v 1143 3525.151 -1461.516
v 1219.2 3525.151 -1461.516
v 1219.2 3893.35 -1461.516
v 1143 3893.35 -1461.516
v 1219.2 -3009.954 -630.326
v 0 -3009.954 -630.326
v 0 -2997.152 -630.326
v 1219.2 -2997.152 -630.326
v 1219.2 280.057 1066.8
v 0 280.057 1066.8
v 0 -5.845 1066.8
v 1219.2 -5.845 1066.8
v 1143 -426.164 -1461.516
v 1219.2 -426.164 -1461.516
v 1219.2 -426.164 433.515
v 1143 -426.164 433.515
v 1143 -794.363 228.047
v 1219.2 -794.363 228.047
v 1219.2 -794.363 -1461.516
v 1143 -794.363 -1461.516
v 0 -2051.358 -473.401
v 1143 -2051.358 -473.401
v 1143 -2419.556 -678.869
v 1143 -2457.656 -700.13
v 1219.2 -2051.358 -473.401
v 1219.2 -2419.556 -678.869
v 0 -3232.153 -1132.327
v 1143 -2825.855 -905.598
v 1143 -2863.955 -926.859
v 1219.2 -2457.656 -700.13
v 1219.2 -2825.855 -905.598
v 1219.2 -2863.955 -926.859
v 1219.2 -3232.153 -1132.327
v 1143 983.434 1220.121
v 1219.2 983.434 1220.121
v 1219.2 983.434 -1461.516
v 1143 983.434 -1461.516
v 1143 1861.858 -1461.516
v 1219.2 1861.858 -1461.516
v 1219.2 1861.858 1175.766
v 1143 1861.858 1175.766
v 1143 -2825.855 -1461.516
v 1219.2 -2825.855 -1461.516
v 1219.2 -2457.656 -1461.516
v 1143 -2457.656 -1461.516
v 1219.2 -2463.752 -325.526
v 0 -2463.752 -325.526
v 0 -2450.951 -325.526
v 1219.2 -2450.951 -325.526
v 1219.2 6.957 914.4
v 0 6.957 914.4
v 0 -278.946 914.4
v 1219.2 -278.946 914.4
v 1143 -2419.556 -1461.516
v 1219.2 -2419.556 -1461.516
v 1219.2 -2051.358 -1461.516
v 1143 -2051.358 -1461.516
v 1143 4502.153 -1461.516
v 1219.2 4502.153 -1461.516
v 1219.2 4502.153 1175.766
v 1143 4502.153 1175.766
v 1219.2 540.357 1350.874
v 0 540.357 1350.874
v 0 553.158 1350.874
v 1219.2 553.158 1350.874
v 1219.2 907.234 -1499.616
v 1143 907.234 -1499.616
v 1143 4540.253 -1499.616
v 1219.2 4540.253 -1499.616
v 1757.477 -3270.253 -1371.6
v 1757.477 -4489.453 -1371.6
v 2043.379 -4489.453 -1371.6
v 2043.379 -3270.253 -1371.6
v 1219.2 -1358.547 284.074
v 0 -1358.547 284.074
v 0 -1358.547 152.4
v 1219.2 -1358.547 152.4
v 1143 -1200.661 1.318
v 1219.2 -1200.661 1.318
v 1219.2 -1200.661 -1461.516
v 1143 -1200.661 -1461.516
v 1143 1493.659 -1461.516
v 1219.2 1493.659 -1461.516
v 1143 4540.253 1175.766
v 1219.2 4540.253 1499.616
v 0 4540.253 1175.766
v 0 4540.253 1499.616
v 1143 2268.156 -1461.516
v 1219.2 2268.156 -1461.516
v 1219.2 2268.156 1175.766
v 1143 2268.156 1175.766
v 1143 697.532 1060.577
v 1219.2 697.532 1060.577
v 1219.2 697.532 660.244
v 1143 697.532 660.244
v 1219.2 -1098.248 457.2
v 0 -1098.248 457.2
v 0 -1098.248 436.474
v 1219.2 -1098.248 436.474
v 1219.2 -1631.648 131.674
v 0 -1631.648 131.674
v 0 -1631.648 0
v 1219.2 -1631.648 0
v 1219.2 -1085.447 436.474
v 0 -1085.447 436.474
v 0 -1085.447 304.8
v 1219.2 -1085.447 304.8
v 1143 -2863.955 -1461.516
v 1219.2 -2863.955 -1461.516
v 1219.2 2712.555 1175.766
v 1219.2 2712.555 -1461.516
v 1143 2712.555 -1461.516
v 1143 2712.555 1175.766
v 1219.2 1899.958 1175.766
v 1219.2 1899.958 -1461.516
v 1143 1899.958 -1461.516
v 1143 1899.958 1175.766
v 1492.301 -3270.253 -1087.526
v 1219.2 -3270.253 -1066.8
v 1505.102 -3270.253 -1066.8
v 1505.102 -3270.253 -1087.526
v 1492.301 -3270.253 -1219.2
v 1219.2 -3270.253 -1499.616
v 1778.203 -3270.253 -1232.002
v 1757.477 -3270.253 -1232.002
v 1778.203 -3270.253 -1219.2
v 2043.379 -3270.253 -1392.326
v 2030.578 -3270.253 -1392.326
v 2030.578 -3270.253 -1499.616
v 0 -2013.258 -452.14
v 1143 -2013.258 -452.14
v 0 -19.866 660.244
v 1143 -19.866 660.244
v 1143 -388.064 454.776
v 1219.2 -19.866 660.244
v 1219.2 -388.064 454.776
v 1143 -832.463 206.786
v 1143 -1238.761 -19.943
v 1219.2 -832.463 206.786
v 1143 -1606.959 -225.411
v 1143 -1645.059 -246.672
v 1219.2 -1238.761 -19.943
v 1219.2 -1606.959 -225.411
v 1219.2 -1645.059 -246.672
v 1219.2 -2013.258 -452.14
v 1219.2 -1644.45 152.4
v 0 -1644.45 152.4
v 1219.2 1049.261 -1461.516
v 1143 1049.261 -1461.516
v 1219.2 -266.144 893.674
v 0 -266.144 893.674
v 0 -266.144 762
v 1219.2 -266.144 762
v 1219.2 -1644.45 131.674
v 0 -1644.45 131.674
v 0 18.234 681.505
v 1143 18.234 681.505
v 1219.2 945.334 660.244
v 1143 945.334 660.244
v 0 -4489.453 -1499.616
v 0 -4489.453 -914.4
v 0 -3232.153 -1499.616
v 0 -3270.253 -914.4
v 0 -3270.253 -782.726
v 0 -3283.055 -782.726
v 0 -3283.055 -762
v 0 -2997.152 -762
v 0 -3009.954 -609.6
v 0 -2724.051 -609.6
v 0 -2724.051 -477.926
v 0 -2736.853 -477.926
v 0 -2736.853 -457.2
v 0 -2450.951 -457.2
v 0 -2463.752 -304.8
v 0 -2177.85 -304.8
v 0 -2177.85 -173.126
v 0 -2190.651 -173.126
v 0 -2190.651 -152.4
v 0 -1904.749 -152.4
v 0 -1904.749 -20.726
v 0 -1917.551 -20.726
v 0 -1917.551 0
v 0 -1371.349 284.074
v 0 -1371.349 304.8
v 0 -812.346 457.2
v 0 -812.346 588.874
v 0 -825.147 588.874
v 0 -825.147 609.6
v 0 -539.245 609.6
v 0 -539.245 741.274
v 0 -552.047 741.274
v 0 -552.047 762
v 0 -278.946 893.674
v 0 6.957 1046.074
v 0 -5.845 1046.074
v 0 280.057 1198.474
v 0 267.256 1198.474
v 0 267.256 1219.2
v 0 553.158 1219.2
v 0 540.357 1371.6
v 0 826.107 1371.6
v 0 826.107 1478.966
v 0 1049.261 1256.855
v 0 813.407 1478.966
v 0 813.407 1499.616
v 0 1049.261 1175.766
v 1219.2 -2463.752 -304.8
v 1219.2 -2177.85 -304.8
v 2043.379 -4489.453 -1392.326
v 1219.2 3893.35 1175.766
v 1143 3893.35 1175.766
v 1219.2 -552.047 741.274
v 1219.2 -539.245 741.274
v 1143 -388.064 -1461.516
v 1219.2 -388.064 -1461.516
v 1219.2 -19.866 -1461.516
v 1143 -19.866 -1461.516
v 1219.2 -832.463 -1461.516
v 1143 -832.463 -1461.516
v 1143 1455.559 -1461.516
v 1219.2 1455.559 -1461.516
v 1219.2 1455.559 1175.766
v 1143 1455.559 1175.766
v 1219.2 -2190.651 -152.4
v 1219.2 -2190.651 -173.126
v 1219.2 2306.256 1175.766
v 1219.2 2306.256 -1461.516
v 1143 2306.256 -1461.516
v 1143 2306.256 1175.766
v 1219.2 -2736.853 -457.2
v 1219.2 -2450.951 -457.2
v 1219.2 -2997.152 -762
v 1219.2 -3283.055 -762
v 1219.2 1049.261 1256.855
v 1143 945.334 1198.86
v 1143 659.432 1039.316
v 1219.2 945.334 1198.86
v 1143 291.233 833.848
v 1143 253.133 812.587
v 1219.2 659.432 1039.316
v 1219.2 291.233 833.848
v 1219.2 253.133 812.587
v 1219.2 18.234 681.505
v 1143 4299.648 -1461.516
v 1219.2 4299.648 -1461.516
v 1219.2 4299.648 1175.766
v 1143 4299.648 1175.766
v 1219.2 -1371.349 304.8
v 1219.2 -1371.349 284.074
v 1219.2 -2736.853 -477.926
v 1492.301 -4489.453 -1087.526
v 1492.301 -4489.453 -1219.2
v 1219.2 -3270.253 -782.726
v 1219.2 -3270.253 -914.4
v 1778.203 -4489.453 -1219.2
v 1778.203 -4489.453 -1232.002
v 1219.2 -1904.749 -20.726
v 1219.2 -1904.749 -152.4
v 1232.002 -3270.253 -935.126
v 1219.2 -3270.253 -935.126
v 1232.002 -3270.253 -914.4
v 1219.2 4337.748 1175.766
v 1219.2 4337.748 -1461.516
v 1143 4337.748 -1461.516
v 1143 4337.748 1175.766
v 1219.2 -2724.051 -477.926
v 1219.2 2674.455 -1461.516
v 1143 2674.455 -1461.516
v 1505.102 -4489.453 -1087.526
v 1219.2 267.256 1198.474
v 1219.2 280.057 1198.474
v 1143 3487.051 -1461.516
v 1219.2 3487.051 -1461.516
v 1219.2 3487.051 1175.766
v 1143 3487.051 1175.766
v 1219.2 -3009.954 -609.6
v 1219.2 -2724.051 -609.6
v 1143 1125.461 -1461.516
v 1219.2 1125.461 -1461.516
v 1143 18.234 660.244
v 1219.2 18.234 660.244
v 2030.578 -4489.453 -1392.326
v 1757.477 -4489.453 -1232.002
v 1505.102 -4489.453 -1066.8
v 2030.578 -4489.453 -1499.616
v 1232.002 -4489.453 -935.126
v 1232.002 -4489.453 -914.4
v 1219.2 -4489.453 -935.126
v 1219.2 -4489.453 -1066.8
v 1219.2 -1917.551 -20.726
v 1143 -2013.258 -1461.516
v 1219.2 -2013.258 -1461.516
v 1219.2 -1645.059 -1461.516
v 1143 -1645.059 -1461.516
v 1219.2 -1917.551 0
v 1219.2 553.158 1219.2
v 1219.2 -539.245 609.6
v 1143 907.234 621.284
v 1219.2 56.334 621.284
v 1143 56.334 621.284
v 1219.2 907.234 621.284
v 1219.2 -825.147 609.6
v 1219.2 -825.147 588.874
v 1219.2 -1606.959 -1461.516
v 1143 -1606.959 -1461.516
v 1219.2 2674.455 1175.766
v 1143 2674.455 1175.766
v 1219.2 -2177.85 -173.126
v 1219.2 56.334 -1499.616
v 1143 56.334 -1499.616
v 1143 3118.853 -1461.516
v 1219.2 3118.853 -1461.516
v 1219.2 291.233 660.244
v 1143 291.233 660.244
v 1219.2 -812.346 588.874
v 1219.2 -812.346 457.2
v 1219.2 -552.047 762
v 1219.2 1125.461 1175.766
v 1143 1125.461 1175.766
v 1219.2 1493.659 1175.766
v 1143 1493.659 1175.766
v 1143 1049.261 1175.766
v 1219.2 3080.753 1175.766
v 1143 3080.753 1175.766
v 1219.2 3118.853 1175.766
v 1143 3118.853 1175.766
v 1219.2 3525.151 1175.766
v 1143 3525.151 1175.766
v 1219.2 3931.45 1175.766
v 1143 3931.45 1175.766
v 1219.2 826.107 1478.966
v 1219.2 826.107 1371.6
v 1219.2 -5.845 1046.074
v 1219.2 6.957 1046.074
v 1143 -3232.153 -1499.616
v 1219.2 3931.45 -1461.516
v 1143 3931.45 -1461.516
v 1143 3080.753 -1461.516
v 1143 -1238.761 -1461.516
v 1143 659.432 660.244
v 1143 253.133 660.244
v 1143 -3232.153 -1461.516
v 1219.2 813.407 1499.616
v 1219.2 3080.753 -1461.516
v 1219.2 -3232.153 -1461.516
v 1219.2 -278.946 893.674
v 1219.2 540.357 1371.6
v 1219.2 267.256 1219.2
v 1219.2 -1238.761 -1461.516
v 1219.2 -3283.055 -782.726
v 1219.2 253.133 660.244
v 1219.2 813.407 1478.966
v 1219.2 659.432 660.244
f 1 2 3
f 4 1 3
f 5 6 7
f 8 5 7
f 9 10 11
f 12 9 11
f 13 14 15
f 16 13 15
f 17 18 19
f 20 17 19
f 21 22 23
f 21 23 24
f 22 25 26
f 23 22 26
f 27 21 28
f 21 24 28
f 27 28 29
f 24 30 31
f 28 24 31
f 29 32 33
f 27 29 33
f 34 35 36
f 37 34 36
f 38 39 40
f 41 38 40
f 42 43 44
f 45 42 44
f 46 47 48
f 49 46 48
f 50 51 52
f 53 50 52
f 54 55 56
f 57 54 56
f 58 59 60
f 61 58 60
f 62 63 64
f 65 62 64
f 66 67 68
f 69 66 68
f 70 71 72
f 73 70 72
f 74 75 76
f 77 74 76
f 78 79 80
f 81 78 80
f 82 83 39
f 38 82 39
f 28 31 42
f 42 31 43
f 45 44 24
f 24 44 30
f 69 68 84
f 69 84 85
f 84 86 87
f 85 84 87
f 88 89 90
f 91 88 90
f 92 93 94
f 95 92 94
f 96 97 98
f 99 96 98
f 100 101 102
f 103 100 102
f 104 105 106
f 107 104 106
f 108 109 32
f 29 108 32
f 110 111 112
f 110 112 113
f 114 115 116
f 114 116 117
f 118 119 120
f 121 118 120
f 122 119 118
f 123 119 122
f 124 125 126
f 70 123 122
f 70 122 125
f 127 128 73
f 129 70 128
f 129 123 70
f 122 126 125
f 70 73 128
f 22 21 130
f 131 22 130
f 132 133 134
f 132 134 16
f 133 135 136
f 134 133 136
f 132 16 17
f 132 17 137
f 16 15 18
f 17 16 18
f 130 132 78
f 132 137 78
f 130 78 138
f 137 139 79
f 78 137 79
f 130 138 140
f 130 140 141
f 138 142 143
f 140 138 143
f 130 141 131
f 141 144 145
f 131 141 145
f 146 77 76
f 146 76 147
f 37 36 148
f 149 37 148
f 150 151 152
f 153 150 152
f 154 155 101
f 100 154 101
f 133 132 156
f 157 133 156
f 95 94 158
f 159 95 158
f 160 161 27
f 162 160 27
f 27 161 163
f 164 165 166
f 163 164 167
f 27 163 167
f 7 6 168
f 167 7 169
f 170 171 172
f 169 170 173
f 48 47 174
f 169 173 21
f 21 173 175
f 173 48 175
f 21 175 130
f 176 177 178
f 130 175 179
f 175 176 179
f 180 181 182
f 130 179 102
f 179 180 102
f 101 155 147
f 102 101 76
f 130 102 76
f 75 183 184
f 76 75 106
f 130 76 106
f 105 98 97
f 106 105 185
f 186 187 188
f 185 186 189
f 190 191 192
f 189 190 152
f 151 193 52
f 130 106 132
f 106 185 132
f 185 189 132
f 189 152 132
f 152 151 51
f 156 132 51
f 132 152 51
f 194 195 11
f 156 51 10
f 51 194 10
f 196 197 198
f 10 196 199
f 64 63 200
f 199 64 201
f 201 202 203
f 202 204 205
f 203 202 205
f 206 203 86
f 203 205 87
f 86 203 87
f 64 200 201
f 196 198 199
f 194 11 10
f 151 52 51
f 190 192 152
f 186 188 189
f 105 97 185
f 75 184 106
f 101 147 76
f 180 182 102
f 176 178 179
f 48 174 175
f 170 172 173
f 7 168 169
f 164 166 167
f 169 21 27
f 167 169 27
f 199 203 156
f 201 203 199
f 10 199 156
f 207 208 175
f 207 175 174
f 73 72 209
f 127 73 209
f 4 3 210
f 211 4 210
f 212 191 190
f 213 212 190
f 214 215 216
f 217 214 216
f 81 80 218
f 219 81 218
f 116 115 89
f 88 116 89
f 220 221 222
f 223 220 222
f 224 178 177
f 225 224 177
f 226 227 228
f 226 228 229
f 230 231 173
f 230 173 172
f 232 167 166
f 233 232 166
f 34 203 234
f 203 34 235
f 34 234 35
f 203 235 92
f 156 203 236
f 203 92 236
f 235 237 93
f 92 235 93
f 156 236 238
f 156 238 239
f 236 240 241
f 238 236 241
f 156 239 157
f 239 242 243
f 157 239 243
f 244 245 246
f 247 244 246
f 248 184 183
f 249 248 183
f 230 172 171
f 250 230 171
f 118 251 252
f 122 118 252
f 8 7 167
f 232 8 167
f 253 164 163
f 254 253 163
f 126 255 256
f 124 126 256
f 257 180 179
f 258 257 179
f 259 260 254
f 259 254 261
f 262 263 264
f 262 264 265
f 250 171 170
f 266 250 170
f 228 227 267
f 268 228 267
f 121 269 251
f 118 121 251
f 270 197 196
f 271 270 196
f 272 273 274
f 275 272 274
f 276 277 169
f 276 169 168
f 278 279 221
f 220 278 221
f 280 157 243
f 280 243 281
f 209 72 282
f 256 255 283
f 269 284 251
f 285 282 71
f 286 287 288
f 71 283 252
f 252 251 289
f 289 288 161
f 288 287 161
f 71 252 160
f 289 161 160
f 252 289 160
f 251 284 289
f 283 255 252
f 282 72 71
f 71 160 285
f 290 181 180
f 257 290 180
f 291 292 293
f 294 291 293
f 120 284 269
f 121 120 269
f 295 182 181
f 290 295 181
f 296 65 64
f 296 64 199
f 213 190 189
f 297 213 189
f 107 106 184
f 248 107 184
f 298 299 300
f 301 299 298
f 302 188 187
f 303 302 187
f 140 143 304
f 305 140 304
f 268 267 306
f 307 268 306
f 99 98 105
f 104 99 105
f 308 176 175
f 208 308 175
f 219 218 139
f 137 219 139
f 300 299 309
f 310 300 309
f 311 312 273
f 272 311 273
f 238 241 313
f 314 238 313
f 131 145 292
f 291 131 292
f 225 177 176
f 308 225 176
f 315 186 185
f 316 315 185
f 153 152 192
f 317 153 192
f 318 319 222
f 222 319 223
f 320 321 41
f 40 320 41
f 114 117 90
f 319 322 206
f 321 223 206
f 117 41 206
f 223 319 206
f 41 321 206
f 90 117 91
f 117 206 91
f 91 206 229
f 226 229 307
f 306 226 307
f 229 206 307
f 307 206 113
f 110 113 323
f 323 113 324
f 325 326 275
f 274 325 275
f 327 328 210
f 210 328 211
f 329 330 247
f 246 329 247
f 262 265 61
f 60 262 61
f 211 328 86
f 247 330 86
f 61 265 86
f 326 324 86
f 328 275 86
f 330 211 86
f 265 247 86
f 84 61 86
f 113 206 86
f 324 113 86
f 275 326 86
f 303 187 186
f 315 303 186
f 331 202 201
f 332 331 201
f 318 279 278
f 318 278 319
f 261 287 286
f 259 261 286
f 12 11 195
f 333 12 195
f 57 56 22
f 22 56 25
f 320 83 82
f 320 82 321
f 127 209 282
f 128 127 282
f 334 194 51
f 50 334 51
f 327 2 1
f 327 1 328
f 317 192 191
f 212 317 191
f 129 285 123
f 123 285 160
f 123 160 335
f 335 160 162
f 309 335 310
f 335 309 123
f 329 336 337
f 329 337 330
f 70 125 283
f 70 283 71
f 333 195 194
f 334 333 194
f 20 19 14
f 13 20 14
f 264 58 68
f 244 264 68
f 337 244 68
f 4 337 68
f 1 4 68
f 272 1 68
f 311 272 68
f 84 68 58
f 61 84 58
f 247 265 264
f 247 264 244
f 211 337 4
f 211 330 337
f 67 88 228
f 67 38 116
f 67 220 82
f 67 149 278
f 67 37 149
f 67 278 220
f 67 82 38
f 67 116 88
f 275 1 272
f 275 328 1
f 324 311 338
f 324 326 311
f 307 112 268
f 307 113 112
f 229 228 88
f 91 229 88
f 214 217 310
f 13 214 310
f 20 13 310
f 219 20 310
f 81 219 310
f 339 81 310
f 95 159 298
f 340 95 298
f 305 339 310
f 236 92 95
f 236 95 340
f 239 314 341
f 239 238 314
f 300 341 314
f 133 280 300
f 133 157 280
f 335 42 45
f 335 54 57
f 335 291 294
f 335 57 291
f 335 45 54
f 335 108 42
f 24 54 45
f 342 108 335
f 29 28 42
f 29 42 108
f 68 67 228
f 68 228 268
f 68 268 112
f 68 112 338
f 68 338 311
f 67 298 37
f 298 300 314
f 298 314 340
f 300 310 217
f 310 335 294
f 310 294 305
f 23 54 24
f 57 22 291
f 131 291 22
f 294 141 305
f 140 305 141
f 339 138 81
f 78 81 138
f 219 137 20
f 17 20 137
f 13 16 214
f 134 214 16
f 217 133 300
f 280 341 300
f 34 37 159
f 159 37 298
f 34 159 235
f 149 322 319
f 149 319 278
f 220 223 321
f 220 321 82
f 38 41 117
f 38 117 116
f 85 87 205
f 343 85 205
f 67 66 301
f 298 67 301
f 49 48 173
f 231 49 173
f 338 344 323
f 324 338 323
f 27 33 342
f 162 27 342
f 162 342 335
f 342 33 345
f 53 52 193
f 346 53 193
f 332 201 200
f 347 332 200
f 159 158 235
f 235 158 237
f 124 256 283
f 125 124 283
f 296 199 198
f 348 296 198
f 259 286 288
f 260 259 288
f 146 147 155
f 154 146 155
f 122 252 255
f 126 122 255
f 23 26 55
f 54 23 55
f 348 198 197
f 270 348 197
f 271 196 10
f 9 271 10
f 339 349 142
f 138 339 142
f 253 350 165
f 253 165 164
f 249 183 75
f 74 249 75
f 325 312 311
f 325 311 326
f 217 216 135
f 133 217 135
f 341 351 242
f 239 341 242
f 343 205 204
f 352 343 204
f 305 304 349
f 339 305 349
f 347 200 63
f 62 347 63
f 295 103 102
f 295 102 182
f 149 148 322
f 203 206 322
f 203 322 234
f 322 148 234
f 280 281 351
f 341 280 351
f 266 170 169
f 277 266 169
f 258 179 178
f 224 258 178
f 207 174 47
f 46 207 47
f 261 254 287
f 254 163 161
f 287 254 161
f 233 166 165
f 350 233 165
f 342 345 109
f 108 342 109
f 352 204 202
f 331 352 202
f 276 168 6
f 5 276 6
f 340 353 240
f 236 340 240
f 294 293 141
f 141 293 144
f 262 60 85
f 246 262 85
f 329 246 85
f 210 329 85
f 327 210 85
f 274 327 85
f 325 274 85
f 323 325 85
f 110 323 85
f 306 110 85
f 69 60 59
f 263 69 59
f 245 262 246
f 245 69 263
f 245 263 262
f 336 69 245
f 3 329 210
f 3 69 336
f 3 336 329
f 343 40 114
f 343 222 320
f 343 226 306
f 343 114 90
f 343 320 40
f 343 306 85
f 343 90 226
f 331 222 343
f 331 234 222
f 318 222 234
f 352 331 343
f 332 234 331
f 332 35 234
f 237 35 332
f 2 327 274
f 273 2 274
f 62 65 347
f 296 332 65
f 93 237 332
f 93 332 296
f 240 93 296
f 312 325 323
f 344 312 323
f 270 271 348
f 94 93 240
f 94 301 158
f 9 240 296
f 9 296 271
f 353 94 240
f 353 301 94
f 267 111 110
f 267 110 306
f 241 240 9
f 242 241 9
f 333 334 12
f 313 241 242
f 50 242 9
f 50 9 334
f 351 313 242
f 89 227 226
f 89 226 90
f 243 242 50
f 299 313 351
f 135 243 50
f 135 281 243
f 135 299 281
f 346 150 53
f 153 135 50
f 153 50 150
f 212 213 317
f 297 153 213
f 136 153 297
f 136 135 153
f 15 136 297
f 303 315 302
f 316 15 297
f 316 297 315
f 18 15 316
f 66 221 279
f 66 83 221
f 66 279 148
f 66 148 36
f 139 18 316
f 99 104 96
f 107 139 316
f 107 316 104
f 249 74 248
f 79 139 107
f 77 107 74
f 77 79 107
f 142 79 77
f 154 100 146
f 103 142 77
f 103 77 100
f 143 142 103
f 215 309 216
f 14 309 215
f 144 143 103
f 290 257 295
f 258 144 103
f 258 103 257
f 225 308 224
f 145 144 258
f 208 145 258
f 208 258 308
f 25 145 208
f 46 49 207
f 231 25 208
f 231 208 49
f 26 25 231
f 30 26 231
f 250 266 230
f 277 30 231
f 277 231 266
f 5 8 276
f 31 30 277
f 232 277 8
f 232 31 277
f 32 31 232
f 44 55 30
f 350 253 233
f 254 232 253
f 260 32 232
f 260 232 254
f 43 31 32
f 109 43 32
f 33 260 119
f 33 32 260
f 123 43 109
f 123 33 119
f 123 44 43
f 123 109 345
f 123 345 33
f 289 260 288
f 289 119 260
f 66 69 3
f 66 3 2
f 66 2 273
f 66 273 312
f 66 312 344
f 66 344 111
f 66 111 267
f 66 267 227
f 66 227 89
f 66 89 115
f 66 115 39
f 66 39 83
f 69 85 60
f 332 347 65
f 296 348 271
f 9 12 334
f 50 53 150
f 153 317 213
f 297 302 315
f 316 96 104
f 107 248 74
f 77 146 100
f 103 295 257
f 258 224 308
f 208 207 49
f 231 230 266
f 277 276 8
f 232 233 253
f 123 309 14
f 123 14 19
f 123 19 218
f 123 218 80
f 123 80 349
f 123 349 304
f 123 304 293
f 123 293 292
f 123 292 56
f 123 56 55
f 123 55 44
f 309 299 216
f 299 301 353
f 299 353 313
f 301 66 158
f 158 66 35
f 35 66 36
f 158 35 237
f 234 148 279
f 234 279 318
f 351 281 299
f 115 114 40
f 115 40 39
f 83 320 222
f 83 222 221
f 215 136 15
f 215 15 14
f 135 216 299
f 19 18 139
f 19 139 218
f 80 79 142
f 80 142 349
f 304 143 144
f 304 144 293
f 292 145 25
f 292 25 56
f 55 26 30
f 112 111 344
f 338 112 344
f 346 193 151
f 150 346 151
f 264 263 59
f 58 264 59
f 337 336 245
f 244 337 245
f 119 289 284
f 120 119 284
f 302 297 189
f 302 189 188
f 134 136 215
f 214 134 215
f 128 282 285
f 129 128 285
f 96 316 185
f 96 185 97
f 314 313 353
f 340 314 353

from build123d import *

# Parameters (mm, degrees)
F1_DEPTH  = 2438.4
F2_W      = 1219.2
F2_H      = 7810.50601472
F3_DEPTH  = 6096
F4_DEPTH  = 1219.2
F6_DEPTH  = 12192
F7_W      = 850.9
F7_H      = 2082.8
F7_W_2    = 330.0984
F7_H_2    = 2637.282
F7_W_3    = 368.1984
F7_W_4    = 164.4047516028
F7_H_3    = 38.1
F8_DEPTH  = 1524
F10_DEPTH = 1143


with BuildPart() as f1:
    # F0 (on Right) → F1 (new body)
    with BuildSketch(Plane.YZ):
        Polygon((4540.25300736, -1499.616), (4540.25300736, 1499.616), (813.40659264, 1499.616), (813.40659264, 1478.9658), (826.10659264, 1478.9658), (826.10659264, 1371.6), (540.35659264, 1371.6), (540.35659264, 1350.8736), (553.15819264, 1350.8736), (553.15819264, 1219.2), (267.25579264, 1219.2), (267.25579264, 1198.4736), (280.05739264, 1198.4736), (280.05739264, 1066.8), (-5.84500736, 1066.8), (-5.84500736, 1046.0736), (6.95659264, 1046.0736), (6.95659264, 914.4), (-278.94580736, 914.4), (-278.94580736, 893.6736), (-266.14420736, 893.6736), (-266.14420736, 762), (-552.04660736, 762), (-552.04660736, 741.2736), (-539.24500736, 741.2736), (-539.24500736, 609.6), (-825.14740736, 609.6), (-825.14740736, 588.8736), (-812.34580736, 588.8736), (-812.34580736, 457.2), (-1098.24820736, 457.2), (-1098.24820736, 436.4736), (-1085.44660736, 436.4736), (-1085.44660736, 304.8), (-1371.34900736, 304.8), (-1371.34900736, 284.0736), (-1358.54740736, 284.0736), (-1358.54740736, 152.4), (-1644.44980736, 152.4), (-1644.44980736, 131.6736), (-1631.64820736, 131.6736), (-1631.64820736, 0), (-1917.55060736, 0), (-1917.55060736, -20.7264), (-1904.74900736, -20.7264), (-1904.74900736, -152.4), (-2190.65140736, -152.4), (-2190.65140736, -173.1264), (-2177.84980736, -173.1264), (-2177.84980736, -304.8), (-2463.75220736, -304.8), (-2463.75220736, -325.5264), (-2450.95060736, -325.5264), (-2450.95060736, -457.2), (-2736.85300736, -457.2), (-2736.85300736, -477.9264), (-2724.05140736, -477.9264), (-2724.05140736, -609.6), (-3009.95380736, -609.6), (-3009.95380736, -630.3264), (-2997.15220736, -630.3264), (-2997.15220736, -762), (-3283.05460736, -762), (-3283.05460736, -782.7264), (-3270.25300736, -782.7264), (-3270.25300736, -914.4), (-4489.45300736, -914.4), (-4489.45300736, -1499.616), align=None)
    extrude(amount=F1_DEPTH)

    # F2 (on face) → F3 (cut)
    with BuildSketch(Plane(origin=(0, 0, -1499.616), x_dir=(1, 0, 0), z_dir=(0, 0, -1))):
        with Locations((1828.8, -635)):
            Rectangle(F2_W, F2_H)
    extrude(amount=-F3_DEPTH, mode=Mode.SUBTRACT)

    # F4 (cut): a face of the model
    f4_faces = [f1.faces().sort_by_distance(p)[0] for p in [
        (2438.4, -3276.65380736, -772.3632),
    ]]
    extrude(f4_faces, amount=-F4_DEPTH, mode=Mode.SUBTRACT)

    # F5 (on face) → F6 (cut)
    with BuildSketch(Plane.XZ.offset(4489.45300736)):
        Polygon((2438.4, -914.4), (1232.0016, -914.4), (1232.0016, -935.1264), (1219.2, -935.1264), (1219.2, -1066.8), (1505.1024, -1066.8), (1505.1024, -1087.5264), (1492.3008, -1087.5264), (1492.3008, -1219.2), (1778.2032, -1219.2), (1778.2032, -1232.0016), (1757.4768, -1232.0016), (1757.4768, -1371.6), (2043.3792, -1371.6), (2043.3792, -1392.3264), (2030.5776, -1392.3264), (2030.5776, -1499.616), (2438.4, -1499.616), align=None)
    extrude(amount=-F6_DEPTH, mode=Mode.SUBTRACT)

    # F7 (on face) → F8 (cut)
    with BuildSketch(Plane.YZ.offset(1219.2)):
        Polygon((-3232.15300736, -1461.516), (-2863.95460736, -1461.516), (-2863.95460736, -926.8592061324), (-3232.15300736, -1132.3270632753), align=None)
        Polygon((-2825.85460736, -1461.516), (-2457.65620736, -1461.516), (-2457.65620736, -700.1301882753), (-2825.85460736, -905.5980454181), align=None)
        Polygon((-2419.55620736, -1461.516), (-2051.35780736, -1461.516), (-2051.35780736, -473.4011704181), (-2419.55620736, -678.869027561), align=None)
        Polygon((-2013.25780736, -1461.516), (-1645.05940736, -1461.516), (-1645.05940736, -246.672152561), (-2013.25780736, -452.1400097039), align=None)
        Polygon((-1606.95940736, -1461.516), (-1238.76100736, -1461.516), (-1238.76100736, -19.9431347039), (-1606.95940736, -225.4109918467), align=None)
        Polygon((-1200.66100736, -1461.516), (-832.46260736, -1461.516), (-832.46260736, 206.7858831533), (-1200.66100736, 1.3180260104), align=None)
        Polygon((-794.36260736, -1461.516), (-426.16420736, -1461.516), (-426.16420736, 433.5149010104), (-794.36260736, 228.0470438676), align=None)
        Polygon((-388.06420736, -1461.516), (-19.86580736, -1461.516), (-19.86580736, 660.2439188676), (-388.06420736, 454.7760617247), align=None)
        with Locations((481.78419264, -420.116)):
            Rectangle(F7_W, F7_H)
        Polygon((18.23419264, 681.5050795818), (18.23419264, 660.2439188676), (253.13339264, 660.2439188676), (253.13339264, 812.587222439), align=None)
        Polygon((659.43179264, 660.2439188676), (659.43179264, 1039.3162402961), (291.23339264, 833.8483831533), (291.23339264, 660.2439188676), align=None)
        Polygon((945.33419264, 660.2439188676), (945.33419264, 1198.8599902961), (697.53179264, 1060.5774010104), (697.53179264, 660.2439188676), align=None)
        Polygon((1049.2610557572, -1461.516), (1049.2610557572, 1256.8548915892), (983.43419264, 1220.1211510104), (983.43419264, -1461.516), align=None)
        with Locations((1290.5102557572, -142.875)):
            Rectangle(F7_W_2, F7_H_2)
        with Locations((1677.7586557572, -142.875)):
            Rectangle(F7_W_3, F7_H_2)
        with Locations((2084.0570557572, -142.875)):
            Rectangle(F7_W_3, F7_H_2)
        with Locations((2490.3554557572, -142.875)):
            Rectangle(F7_W_3, F7_H_2)
        with Locations((2896.6538557572, -142.875)):
            Rectangle(F7_W_3, F7_H_2)
        with Locations((3302.9522557572, -142.875)):
            Rectangle(F7_W_3, F7_H_2)
        with Locations((3709.2506557572, -142.875)):
            Rectangle(F7_W_3, F7_H_2)
        with Locations((4115.5490557572, -142.875)):
            Rectangle(F7_W_3, F7_H_2)
        with Locations((4419.9506315586, -142.875)):
            Rectangle(F7_W_4, F7_H_2)
        with Locations((481.78419264, -1480.566)):
            Rectangle(F7_W, F7_H_3)
    extrude(amount=-F8_DEPTH, mode=Mode.SUBTRACT)

    # F9 (on face) → F10 (cut)
    with BuildSketch(Plane(origin=(0, 0, 0), x_dir=(0, -1, 0), z_dir=(-1, 0, 0))):
        Polygon((-4502.15300736, 1175.766), (-4540.25300736, 1175.766), (-4540.25300736, -1499.616), (-907.23419264, -1499.616), (-907.23419264, 621.284), (-56.33419264, 621.284), (-56.33419264, -1499.616), (3232.15300736, -1499.616), (3232.15300736, -1461.516), (2863.95460736, -1461.516), (2863.95460736, -926.8592061324), (2825.85460736, -905.5980454181), (2825.85460736, -1461.516), (2457.65620736, -1461.516), (2457.65620736, -700.1301882753), (2419.55620736, -678.869027561), (2419.55620736, -1461.516), (2051.35780736, -1461.516), (2051.35780736, -473.4011704181), (2013.25780736, -452.1400097039), (2013.25780736, -1461.516), (1645.05940736, -1461.516), (1645.05940736, -246.672152561), (1606.95940736, -225.4109918467), (1606.95940736, -1461.516), (1238.76100736, -1461.516), (1238.76100736, -19.9431347039), (1200.66100736, 1.3180260104), (1200.66100736, -1461.516), (832.46260736, -1461.516), (832.46260736, 206.7858831533), (794.36260736, 228.0470438676), (794.36260736, -1461.516), (426.16420736, -1461.516), (426.16420736, 433.5149010104), (388.06420736, 454.7760617247), (388.06420736, -1461.516), (19.86580736, -1461.516), (19.86580736, 660.2439188676), (-18.23419264, 681.5050795818), (-18.23419264, 660.2439188676), (-253.13339264, 660.2439188676), (-253.13339264, 812.587222439), (-291.23339264, 833.8483831533), (-291.23339264, 660.2439188676), (-659.43179264, 660.2439188676), (-659.43179264, 1039.3162402961), (-697.53179264, 1060.5774010104), (-697.53179264, 660.2439188676), (-945.33419264, 660.2439188676), (-945.33419264, 1198.8599902961), (-983.43419264, 1220.1211510104), (-983.43419264, -1461.516), (-1049.2610557572, -1461.516), (-1049.2610557572, 1175.766), (-1125.4610557572, 1175.766), (-1125.4610557572, -1461.516), (-1455.5594557572, -1461.516), (-1455.5594557572, 1175.766), (-1493.6594557572, 1175.766), (-1493.6594557572, -1461.516), (-1861.8578557572, -1461.516), (-1861.8578557572, 1175.766), (-1899.9578557572, 1175.766), (-1899.9578557572, -1461.516), (-2268.1562557572, -1461.516), (-2268.1562557572, 1175.766), (-2306.2562557572, 1175.766), (-2306.2562557572, -1461.516), (-2674.4546557572, -1461.516), (-2674.4546557572, 1175.766), (-2712.5546557572, 1175.766), (-2712.5546557572, -1461.516), (-3080.7530557572, -1461.516), (-3080.7530557572, 1175.766), (-3118.8530557572, 1175.766), (-3118.8530557572, -1461.516), (-3487.0514557572, -1461.516), (-3487.0514557572, 1175.766), (-3525.1514557572, 1175.766), (-3525.1514557572, -1461.516), (-3893.3498557572, -1461.516), (-3893.3498557572, 1175.766), (-3931.4498557572, 1175.766), (-3931.4498557572, -1461.516), (-4299.6482557572, -1461.516), (-4299.6482557572, 1175.766), (-4337.7482557572, 1175.766), (-4337.7482557572, -1461.516), (-4502.15300736, -1461.516), align=None)
    extrude(amount=-F10_DEPTH, mode=Mode.SUBTRACT)


solid = f1.part
